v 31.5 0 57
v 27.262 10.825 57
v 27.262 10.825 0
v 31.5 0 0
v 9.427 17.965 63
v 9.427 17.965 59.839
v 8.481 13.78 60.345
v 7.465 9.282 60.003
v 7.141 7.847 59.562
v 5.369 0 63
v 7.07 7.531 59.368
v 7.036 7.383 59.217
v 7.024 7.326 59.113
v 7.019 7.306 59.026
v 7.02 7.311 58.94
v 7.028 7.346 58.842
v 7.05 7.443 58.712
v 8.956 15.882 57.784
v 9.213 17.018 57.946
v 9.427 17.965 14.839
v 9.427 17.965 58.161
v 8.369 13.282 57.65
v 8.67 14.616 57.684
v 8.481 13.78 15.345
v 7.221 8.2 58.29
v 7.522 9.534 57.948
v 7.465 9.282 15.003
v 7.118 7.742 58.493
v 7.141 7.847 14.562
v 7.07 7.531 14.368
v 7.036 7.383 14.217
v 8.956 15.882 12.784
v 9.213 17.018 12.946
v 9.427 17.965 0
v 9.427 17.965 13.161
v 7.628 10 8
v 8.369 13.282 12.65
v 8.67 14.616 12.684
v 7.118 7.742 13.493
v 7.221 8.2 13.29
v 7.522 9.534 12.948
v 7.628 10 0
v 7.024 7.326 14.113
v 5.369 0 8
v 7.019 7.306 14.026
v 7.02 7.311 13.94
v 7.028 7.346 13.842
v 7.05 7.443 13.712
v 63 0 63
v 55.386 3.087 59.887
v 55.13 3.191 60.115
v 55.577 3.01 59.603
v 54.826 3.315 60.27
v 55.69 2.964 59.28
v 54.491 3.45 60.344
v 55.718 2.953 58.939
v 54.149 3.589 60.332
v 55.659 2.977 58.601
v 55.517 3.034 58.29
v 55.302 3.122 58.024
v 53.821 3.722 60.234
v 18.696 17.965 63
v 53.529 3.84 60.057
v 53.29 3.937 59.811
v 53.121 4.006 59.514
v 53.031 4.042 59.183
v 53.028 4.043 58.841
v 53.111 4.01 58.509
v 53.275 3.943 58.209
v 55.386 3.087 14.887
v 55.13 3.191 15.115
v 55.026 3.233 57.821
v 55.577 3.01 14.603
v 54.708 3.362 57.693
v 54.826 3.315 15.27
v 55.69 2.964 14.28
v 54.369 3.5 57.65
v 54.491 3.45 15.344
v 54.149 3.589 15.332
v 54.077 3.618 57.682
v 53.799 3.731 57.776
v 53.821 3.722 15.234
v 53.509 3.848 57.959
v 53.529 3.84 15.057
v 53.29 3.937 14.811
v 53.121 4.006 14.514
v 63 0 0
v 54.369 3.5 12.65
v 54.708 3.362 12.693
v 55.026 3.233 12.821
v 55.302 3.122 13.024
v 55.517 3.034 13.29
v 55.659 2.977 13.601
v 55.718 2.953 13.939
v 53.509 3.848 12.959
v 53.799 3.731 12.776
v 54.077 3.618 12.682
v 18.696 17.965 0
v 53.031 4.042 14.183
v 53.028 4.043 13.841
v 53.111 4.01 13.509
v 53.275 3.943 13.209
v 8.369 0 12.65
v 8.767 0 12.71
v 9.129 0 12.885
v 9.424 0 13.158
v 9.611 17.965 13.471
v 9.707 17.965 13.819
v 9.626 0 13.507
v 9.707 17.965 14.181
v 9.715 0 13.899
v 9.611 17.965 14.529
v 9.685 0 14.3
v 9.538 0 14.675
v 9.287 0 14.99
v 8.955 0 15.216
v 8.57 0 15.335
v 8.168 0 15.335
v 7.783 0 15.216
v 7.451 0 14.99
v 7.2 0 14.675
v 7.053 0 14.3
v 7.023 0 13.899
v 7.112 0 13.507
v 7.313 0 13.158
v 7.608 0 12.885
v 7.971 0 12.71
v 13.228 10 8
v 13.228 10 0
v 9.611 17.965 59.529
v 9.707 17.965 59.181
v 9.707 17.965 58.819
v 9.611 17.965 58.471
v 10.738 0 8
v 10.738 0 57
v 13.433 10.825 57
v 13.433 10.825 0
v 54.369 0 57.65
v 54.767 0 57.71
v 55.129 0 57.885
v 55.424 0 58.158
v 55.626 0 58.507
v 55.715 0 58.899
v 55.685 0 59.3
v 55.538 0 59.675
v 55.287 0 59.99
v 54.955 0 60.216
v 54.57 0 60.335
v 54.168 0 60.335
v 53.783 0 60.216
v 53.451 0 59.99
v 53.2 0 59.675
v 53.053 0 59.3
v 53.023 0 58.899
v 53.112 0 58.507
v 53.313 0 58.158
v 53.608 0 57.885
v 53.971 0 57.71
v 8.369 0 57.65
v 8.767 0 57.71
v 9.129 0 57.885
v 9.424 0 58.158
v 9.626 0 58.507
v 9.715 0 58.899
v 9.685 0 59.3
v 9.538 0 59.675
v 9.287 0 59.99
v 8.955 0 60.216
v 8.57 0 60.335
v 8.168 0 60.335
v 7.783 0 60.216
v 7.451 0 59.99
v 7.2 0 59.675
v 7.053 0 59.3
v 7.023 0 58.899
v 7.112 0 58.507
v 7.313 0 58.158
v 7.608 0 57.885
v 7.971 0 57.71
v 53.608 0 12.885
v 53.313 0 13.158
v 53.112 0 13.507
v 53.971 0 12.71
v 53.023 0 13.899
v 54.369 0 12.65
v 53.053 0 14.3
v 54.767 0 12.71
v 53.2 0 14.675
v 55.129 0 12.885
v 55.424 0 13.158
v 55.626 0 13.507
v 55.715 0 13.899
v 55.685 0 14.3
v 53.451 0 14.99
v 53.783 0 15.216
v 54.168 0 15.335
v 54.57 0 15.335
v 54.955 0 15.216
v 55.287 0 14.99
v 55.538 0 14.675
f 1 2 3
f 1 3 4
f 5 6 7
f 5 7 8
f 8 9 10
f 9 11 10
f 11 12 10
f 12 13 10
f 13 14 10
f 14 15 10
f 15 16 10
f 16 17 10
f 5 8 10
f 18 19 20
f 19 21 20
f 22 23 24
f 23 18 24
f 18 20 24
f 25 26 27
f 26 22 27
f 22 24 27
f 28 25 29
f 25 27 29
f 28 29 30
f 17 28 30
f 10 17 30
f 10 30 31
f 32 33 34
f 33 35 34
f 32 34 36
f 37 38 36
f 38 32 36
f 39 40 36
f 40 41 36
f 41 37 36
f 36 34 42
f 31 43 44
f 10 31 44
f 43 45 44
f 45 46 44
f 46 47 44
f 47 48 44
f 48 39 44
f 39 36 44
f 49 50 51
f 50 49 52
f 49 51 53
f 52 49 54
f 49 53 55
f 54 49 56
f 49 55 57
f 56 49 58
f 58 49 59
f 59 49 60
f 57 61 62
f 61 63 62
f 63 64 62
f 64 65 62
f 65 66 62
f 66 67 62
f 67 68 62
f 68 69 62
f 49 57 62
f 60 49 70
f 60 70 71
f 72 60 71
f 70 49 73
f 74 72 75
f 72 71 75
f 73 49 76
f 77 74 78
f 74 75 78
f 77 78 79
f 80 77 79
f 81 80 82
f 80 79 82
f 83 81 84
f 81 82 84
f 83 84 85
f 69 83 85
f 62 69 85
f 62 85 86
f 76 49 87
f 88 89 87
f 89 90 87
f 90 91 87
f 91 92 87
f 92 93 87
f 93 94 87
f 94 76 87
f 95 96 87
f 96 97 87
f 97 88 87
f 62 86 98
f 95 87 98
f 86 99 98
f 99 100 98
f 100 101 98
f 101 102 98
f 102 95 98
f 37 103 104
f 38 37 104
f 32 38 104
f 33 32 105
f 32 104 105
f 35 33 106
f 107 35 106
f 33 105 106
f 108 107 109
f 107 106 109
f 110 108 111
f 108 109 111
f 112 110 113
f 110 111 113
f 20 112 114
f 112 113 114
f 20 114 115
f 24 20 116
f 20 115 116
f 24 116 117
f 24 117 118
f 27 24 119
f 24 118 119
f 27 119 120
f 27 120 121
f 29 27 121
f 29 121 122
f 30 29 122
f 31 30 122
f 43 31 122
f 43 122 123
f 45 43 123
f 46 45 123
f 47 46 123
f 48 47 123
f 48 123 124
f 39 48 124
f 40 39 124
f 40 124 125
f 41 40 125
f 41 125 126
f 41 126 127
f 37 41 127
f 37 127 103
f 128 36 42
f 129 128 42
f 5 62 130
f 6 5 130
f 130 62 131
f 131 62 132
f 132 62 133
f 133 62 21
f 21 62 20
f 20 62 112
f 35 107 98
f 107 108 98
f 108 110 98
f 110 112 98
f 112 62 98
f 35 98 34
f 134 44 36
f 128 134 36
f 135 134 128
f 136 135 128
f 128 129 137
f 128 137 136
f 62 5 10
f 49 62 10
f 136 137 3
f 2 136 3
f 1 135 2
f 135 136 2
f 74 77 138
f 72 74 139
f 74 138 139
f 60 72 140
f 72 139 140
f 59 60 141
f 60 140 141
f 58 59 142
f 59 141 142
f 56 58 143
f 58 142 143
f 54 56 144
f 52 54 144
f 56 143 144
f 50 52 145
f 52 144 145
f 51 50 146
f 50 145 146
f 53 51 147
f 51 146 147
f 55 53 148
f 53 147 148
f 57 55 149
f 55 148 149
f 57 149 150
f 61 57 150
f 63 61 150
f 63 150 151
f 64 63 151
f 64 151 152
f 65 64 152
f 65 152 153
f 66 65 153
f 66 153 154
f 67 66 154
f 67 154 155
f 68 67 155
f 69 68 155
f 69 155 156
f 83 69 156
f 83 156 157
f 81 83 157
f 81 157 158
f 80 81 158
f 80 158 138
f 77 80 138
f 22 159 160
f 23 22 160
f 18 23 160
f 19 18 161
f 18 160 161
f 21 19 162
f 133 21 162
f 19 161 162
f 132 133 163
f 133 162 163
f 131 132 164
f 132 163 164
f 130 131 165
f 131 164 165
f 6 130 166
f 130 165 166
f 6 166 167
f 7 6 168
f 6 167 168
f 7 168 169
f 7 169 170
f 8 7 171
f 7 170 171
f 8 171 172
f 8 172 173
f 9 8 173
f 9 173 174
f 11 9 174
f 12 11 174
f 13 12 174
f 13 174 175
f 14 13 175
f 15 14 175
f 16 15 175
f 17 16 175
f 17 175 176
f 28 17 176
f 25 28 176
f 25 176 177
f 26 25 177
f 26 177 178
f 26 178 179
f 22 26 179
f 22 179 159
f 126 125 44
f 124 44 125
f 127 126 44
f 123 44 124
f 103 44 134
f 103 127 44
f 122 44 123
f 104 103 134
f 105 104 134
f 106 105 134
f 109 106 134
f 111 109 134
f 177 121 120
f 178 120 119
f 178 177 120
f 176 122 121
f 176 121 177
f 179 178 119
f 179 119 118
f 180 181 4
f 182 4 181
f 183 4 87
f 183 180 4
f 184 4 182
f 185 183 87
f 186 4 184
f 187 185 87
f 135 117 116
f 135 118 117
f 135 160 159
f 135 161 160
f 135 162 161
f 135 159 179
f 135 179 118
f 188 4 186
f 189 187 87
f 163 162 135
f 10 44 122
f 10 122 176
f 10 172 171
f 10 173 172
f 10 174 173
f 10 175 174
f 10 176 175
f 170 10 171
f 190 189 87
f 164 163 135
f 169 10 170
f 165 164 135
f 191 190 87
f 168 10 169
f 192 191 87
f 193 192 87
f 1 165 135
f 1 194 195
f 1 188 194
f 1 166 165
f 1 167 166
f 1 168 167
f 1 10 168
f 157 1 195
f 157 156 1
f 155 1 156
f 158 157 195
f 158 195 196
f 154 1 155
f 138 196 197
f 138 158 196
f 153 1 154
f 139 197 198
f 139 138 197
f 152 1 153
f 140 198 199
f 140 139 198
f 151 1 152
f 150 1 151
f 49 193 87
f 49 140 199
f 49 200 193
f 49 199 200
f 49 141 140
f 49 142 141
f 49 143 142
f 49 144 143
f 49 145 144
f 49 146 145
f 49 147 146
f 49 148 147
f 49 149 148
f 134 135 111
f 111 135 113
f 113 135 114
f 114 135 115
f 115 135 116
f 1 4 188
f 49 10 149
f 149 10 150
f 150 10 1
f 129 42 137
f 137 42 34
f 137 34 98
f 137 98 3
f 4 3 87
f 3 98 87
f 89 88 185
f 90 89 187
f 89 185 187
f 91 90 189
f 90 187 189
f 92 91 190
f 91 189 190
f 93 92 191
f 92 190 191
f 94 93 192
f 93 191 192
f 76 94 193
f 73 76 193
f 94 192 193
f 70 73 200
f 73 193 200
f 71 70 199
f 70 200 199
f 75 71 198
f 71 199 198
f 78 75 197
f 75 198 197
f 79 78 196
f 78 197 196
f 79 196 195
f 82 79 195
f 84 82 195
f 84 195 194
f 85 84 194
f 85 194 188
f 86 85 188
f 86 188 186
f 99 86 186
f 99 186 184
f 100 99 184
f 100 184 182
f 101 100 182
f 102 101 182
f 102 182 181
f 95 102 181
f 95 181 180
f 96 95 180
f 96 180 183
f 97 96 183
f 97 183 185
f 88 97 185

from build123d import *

# Parameters (mm, degrees)
EXTRUDE_1_DEPTH     = 63
EXTRUDE_2_DEPTH     = 6
SKETCH_3_W          = 8
SKETCH_3_H          = 10
CUT_EXTRUDE_1_DEPTH = 19
SKETCH_4_R          = 1.35
CUT_EXTRUDE_2_DEPTH = 27


with BuildPart() as part:
    # 草图1 → 凸台-拉伸1 (new body)
    with BuildSketch(Plane.XY):
        Polygon((5.368916437, 0), (10.737832874, 0), (13.433272115, 10.825245017), (27.262006405, 10.825245017), (31.5, 0), (63, 0), (18.696157585, 17.96451652), (9.426538108, 17.96451652), align=None)
    extrude(amount=EXTRUDE_1_DEPTH)

    # 草图2 → 凸台-拉伸2 (add)
    with BuildSketch(Plane.XY.offset(63)):
        Polygon((10.737832874, 0), (31.5, 0), (27.262006405, 10.825245017), (13.433272115, 10.825245017), align=None)
    extrude(amount=-EXTRUDE_2_DEPTH)

    # 草图3 → 切除-拉伸1 (cut)
    with BuildSketch(Plane(origin=(0, 0, 0), x_dir=(0, 0, -1), z_dir=(1, 0, 0))):
        with Locations((-4, 5)):
            Rectangle(SKETCH_3_W, SKETCH_3_H)
    extrude(amount=CUT_EXTRUDE_1_DEPTH, mode=Mode.SUBTRACT)

    # 草图4 → 切除-拉伸2 (cut)
    with BuildSketch(Plane.XZ):
        with Locations(Location((8.368916437, 59, 0), (0, 0, 270))):
            Circle(SKETCH_4_R)
        with Locations(Location((54.368916437, 59, 0), (0, 0, 270))):
            Circle(SKETCH_4_R)
        with Locations(Location((54.368916437, 14, 0), (0, 0, 270))):
            Circle(SKETCH_4_R)
        with Locations(Location((8.368916437, 14, 0), (0, 0, 270))):
            Circle(SKETCH_4_R)
    extrude(amount=-CUT_EXTRUDE_2_DEPTH, mode=Mode.SUBTRACT)


solid = part.part
